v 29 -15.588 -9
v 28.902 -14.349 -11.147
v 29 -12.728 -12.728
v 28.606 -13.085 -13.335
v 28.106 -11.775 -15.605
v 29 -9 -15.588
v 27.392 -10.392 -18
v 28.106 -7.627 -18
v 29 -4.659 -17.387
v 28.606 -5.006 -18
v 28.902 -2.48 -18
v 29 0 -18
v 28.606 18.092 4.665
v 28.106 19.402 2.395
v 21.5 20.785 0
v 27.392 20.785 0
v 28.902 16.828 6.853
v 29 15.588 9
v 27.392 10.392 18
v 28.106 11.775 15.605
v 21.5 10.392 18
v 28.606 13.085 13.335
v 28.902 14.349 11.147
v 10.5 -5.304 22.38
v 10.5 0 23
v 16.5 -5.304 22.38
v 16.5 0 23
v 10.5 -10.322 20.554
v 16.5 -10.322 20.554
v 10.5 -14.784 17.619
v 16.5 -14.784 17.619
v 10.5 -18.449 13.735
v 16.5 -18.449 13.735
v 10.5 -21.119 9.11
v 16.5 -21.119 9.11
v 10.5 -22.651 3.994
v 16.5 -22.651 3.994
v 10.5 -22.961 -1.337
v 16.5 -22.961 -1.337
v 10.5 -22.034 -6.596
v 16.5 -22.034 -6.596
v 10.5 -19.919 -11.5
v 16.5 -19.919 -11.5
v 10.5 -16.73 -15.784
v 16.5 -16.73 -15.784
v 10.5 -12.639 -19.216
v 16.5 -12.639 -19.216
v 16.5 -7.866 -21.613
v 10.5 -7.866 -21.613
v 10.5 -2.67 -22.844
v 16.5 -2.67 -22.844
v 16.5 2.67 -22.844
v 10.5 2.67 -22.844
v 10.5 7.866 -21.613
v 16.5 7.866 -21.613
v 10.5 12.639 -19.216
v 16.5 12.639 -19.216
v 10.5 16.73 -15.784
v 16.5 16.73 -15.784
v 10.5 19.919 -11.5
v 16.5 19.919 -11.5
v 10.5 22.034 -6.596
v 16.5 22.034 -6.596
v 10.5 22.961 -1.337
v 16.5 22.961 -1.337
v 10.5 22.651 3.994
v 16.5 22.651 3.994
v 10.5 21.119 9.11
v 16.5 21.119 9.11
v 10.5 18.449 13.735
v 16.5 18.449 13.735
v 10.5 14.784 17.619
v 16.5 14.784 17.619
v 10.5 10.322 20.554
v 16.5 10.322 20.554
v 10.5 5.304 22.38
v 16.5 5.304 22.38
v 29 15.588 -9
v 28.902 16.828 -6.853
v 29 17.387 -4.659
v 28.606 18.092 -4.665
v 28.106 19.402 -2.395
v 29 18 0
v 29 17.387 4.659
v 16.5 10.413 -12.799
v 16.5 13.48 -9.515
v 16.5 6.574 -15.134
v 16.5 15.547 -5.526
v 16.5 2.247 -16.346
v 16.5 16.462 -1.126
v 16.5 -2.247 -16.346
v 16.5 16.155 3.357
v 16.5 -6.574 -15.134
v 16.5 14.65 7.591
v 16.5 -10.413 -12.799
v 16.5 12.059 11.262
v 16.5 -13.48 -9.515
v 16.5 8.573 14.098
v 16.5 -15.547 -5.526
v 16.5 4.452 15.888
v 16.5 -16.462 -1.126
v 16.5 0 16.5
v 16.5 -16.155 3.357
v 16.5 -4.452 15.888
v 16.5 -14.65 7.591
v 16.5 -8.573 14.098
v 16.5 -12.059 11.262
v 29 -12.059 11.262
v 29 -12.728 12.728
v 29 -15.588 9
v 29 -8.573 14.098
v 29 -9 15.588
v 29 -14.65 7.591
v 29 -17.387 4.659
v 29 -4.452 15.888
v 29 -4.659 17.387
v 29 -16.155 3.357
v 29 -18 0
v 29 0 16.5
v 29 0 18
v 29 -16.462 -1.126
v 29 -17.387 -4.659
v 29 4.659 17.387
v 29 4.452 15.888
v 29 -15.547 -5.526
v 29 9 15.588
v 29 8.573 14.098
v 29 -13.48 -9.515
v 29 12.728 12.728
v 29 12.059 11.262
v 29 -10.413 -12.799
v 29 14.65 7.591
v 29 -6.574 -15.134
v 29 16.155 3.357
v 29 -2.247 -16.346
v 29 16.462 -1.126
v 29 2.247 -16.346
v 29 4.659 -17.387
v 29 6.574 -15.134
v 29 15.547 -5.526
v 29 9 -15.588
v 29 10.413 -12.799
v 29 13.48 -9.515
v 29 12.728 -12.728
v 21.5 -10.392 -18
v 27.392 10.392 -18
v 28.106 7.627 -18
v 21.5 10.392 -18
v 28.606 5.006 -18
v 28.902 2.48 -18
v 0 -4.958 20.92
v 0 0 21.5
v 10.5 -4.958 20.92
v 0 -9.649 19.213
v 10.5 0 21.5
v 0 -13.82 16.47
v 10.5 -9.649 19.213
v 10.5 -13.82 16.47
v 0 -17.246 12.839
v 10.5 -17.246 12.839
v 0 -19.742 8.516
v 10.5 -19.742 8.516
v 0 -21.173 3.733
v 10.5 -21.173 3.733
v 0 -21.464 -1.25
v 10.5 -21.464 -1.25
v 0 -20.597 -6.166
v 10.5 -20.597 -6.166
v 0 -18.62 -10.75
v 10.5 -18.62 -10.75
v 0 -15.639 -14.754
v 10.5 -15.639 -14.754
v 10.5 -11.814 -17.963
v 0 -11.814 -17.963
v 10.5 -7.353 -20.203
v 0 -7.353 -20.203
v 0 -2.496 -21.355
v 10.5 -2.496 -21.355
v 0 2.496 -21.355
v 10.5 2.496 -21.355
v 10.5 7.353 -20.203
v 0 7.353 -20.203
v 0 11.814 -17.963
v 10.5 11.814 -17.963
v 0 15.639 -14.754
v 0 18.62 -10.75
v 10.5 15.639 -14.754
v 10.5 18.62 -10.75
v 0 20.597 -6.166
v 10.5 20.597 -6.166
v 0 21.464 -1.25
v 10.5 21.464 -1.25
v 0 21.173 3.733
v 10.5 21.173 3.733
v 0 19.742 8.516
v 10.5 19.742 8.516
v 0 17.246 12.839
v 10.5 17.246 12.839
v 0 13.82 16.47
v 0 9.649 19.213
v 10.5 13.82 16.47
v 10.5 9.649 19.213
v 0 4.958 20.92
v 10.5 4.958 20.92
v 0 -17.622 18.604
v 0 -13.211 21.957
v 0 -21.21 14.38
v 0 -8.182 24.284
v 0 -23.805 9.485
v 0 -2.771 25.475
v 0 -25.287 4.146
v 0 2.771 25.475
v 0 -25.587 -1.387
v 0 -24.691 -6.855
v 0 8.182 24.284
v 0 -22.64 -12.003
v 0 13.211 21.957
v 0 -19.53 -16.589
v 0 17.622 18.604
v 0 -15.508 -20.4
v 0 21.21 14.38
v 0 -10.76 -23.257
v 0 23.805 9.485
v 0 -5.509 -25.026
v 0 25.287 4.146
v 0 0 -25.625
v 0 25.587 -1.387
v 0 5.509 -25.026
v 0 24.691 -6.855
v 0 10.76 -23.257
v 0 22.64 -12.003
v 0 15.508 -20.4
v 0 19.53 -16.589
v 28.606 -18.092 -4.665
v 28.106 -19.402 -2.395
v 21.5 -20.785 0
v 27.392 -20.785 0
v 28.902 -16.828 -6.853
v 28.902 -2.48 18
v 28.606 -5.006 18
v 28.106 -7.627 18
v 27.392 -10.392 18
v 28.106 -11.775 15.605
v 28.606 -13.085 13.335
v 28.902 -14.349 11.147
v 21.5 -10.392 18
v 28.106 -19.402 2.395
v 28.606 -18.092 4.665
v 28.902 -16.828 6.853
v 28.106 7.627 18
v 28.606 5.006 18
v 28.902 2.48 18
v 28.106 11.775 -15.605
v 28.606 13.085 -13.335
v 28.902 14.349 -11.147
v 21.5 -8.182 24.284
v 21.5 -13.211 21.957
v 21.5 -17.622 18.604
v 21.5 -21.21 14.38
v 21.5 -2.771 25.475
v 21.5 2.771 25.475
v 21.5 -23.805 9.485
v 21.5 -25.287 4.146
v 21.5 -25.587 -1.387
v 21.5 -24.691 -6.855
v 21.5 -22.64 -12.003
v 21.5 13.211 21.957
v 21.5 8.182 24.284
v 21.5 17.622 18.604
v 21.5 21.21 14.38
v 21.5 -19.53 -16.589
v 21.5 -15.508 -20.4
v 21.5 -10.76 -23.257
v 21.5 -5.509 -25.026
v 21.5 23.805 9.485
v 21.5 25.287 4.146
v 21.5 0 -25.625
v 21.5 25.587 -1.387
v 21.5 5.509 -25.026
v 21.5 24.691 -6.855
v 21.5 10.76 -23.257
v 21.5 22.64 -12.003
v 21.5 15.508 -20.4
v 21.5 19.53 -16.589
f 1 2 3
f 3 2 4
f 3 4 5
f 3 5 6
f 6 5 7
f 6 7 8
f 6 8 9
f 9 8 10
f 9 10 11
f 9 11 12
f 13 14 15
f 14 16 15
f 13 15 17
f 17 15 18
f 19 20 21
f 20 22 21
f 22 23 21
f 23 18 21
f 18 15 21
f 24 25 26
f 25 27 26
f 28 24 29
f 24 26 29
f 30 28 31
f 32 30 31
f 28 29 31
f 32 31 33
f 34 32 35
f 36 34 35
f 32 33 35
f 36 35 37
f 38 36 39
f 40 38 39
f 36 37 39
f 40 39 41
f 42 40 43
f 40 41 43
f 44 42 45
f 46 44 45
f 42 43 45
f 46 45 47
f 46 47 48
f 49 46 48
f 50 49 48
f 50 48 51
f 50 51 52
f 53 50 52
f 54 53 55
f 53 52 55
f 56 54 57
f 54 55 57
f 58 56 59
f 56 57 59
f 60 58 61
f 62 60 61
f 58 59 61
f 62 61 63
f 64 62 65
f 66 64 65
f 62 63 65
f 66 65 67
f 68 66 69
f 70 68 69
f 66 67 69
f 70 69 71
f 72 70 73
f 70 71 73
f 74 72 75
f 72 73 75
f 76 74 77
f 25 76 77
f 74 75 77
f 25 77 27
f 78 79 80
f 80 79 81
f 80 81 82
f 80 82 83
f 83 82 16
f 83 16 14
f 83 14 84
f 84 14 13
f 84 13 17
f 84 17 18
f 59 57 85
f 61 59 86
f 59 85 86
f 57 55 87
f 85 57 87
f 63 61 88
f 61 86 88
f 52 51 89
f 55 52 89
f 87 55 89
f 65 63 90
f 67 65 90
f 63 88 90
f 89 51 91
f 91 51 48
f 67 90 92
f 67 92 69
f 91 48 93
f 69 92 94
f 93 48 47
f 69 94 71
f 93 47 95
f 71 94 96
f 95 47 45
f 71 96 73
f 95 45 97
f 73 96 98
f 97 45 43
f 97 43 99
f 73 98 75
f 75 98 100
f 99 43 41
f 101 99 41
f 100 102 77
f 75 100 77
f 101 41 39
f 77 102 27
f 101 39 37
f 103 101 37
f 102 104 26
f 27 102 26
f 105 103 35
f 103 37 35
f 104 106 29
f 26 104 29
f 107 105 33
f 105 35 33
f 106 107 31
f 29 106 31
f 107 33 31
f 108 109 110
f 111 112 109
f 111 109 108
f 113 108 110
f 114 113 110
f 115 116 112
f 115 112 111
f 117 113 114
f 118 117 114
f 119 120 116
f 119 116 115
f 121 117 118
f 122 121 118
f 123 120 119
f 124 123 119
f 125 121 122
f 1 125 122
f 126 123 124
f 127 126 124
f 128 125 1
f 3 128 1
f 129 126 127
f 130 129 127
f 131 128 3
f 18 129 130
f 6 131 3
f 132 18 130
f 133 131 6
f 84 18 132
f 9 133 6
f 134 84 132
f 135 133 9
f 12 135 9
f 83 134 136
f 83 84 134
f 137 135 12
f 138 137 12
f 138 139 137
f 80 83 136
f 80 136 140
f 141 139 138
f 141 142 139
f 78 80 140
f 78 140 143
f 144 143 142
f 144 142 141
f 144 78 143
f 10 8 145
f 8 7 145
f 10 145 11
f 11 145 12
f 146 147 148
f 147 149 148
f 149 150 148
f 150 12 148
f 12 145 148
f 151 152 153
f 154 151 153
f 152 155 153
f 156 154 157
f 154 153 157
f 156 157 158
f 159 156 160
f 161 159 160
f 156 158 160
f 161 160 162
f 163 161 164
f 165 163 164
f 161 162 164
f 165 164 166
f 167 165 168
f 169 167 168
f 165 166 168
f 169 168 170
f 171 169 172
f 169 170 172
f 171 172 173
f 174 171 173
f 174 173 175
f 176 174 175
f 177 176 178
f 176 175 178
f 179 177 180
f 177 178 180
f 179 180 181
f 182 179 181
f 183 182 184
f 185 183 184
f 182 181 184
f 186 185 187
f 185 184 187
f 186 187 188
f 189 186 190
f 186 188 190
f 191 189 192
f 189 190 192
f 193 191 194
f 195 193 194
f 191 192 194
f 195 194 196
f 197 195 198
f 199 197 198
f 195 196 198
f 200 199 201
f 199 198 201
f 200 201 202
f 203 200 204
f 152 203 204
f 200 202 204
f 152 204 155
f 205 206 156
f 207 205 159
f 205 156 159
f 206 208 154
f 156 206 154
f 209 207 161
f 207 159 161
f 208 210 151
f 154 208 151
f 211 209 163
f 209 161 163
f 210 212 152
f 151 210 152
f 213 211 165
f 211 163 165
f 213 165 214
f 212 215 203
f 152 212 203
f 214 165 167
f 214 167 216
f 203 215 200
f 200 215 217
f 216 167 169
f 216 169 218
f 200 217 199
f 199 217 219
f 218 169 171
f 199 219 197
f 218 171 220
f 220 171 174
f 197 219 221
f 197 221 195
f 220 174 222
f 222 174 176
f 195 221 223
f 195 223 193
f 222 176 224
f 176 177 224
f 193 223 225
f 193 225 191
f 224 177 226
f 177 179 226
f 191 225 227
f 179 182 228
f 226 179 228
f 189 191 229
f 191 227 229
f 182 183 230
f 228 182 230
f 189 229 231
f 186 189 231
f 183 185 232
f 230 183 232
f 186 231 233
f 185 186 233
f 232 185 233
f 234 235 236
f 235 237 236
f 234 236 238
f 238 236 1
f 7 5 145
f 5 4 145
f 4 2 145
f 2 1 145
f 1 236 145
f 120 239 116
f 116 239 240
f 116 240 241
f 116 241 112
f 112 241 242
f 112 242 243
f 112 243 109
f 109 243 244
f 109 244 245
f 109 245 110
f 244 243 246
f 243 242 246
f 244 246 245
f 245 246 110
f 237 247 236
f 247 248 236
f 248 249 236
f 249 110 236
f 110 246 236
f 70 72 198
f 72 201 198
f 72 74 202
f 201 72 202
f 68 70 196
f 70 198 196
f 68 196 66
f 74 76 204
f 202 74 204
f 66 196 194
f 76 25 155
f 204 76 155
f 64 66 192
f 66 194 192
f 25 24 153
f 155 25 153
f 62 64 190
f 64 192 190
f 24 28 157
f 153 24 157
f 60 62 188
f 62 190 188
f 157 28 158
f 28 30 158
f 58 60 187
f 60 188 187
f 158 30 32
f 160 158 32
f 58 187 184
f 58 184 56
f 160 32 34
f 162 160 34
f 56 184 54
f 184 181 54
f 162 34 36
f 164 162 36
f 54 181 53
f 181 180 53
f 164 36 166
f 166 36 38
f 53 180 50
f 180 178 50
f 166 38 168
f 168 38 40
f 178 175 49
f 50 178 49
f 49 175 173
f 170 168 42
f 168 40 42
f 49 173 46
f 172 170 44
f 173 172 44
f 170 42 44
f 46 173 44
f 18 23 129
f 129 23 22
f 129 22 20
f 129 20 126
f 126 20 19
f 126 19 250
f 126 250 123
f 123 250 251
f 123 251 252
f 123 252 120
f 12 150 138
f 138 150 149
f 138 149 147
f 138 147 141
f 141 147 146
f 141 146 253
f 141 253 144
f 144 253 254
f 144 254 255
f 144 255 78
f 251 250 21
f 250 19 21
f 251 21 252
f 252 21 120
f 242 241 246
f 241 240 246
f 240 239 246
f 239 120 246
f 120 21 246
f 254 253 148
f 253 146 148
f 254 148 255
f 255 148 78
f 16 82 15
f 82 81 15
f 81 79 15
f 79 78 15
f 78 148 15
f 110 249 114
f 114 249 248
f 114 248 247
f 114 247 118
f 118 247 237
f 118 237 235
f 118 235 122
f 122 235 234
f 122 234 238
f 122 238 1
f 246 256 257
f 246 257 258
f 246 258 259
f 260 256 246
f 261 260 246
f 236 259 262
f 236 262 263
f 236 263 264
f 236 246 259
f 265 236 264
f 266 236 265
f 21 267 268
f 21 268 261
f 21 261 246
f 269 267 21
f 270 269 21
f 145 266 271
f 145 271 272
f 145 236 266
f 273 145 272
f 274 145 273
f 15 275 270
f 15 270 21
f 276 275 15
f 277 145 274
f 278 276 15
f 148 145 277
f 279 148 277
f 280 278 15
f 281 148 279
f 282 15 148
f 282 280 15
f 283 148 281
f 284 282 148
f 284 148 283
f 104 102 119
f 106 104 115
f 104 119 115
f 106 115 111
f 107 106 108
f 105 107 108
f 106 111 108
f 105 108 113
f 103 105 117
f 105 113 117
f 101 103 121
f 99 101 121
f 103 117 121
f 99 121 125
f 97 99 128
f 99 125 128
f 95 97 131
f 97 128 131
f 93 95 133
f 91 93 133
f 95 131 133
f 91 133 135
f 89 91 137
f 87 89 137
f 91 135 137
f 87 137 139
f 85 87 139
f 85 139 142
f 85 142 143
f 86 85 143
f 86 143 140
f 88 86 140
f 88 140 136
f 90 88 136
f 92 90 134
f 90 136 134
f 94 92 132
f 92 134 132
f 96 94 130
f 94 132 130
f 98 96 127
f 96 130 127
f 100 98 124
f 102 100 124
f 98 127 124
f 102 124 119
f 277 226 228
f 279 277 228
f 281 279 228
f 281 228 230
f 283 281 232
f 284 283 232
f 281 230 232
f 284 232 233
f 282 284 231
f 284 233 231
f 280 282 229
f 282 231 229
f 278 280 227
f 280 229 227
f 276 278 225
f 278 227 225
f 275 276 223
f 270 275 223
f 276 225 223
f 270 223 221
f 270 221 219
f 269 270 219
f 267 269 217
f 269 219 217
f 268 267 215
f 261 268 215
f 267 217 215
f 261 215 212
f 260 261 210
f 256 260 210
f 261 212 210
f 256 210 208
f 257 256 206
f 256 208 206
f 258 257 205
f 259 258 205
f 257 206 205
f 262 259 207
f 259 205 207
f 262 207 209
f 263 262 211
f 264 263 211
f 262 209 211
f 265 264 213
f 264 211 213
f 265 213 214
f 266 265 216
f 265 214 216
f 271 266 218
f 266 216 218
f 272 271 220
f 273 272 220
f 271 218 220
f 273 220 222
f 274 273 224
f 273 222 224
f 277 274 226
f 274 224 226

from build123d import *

# Parameters (mm, degrees)
SKETCH_2_R      = 25.625
EXTRUDE_1_DEPTH = 21.5
EXTRUDE_2_DEPTH = 7.5


with BuildPart() as part:
    # 草圖2 → 伸長1 (new body)
    with BuildSketch(Plane(origin=(0, 0, 0), x_dir=(0, 0, -1), z_dir=(1, 0, 0))):
        Circle(SKETCH_2_R)
    extrude(amount=EXTRUDE_1_DEPTH)

    # 草圖3 → 伸長2 (add)
    with BuildSketch(Plane(origin=(21.5, 0, 0), x_dir=(0, 0, -1), z_dir=(1, 0, 0))):
        Polygon((0, 20.784609691), (-18, 10.392304845), (-18, -10.392304845), (0, -20.784609691), (18, -10.392304845), (18, 10.392304845), align=None)
    extrude(amount=EXTRUDE_2_DEPTH)

    # 草圖4 → 除料-旋轉1 (revolve, cut)
    with BuildSketch(Plane.XY):
        Polygon((27.392304845, 20.784609691), (29, 20.784609691), (29, 18), align=None)
    revolve(axis=Axis((0, 0, 0), (1, 0, 0)), mode=Mode.SUBTRACT)

    # 草圖5 → 除料-旋轉2 (revolve, cut)
    with BuildSketch(Plane.XY, mode=Mode.PRIVATE) as cut_revolve_2_sk:
        Polygon((0, 0), (0, 21.5), (10.5, 21.5), (10.5, 23), (16.5, 23), (16.5, 16.5), (29, 16.5), (29, 0), align=None)
    revolve(cut_revolve_2_sk.sketch.rotate(Axis((0, 0, 0), (1, 0, 0)), 90), axis=Axis((0, 0, 0), (1, 0, 0)), mode=Mode.SUBTRACT)


solid = part.part
